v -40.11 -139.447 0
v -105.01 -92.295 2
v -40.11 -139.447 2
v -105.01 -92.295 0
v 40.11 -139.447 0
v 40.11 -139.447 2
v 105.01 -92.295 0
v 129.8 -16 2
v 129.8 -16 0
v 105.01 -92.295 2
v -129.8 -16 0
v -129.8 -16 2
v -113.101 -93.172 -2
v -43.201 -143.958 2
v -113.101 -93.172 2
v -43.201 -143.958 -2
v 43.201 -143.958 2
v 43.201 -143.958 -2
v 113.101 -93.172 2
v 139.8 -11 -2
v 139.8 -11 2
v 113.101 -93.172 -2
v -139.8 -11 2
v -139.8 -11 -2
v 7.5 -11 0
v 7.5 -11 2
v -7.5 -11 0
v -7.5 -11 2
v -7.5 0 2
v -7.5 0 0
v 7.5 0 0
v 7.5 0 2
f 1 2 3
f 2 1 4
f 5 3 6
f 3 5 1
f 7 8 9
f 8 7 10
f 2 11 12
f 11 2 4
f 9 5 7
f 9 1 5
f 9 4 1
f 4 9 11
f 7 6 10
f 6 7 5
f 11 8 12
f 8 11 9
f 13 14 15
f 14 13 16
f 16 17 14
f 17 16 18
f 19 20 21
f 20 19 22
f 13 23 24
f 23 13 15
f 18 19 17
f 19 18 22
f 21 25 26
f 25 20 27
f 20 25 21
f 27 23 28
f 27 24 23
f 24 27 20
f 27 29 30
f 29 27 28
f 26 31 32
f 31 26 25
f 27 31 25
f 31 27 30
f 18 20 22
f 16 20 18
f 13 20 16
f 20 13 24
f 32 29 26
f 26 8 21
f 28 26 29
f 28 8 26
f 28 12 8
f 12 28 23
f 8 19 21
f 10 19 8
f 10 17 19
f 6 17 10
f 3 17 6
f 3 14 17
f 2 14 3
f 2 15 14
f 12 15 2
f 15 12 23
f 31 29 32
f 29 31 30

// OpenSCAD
// file: Shared.scad
total_radius=161.8;
button_hole_radius=11.6;
button_outline_radius=15;
button_lip_radius=12.6;
button_lip_height=2;
lid_buffer=2;
lid_thickness=10;
bottom_thickness=5;
button_inset=lid_thickness+bottom_thickness+20;
button_outline_inset = lid_thickness + bottom_thickness + 16.8;
total_height=50;
lock_tube_outer_radius=5;
lock_tube_inner_radius=3.5;
lock_tube_thickness=lock_tube_outer_radius-lock_tube_inner_radius;
lock_slot_width=17;
lock_slot_height=total_height/2+lock_tube_outer_radius;
engrave_depth=3;
honeycomb_hex_radius = 10;
module EthernetCableHole() {
	translate([-total_radius+2*lid_thickness+2*bottom_thickness+20, 1, 20]) rotate([90, 0, 0]) linear_extrude(height=30) circle(r=10, $fn=100);
}

module PowerCableHole() {
	translate([total_radius-2*lid_thickness-2*bottom_thickness-20, 1, 20]) rotate([90, 0, 0]) linear_extrude(height=30) circle(r=7.5, $fn=100);
}
// file: Bottom.scad
include <Shared.scad>

module Bottom() {
	union() {
		difference() {
			linear_extrude(height=total_height-lid_thickness+4) circle(r=total_radius-(2*lid_thickness)-lid_buffer, $fn=10);
			translate([-200, 0, -1]) linear_extrude(height=total_height+2) square(size=[400, 200], center=false);
			BottomInnerCavity();
			translate([0, 0, 5]) EthernetCableHole();
			translate([0, 0, 5]) PowerCableHole();
		};
		BottomLockTube();
	}
}

module BottomInnerCavity() {
	difference() {
		translate([0, -bottom_thickness, bottom_thickness]) linear_extrude(height=total_height-bottom_thickness+1) circle(r=total_radius-(2*bottom_thickness)-(2*lid_thickness)-lid_buffer, $fn=10);
		translate([-200, -bottom_thickness, bottom_thickness-1]) linear_extrude(height=total_height+2) square(size=[400, 200], center=false);
	}
}

module BottomLockTube() {
	translate([-(lock_slot_width-lid_buffer)/2, lock_tube_outer_radius+lid_thickness, lock_slot_height+bottom_thickness-lock_tube_outer_radius]) rotate([-90, 180, -90]) linear_extrude(height=lock_slot_width-lid_buffer) difference(){
		union() {
			polygon([[0, lock_tube_outer_radius], [lock_tube_outer_radius, 0], [lock_tube_outer_radius, lock_tube_outer_radius-lock_slot_height], [-lid_thickness-lock_tube_outer_radius-1, lock_tube_outer_radius-lock_slot_height], [-lid_thickness-lock_tube_outer_radius-1, lock_tube_outer_radius]]);
			circle(r=lock_tube_outer_radius, $fn=500);
		}
		circle(r=lock_tube_inner_radius, $fn=500);
	}
}
// file: Top.scad
include <Shared.scad>

module Top() {
	union() {
		difference() {
			TopBody();
			ButtonHoles(button_hole_radius, button_inset);
			TopTexture();
			PowerCableHole();
			LockSlot();
		};
		translate([-lock_slot_width, -lid_thickness-1, -bottom_thickness]) TopLockTube();
		translate([lock_slot_width, -lid_thickness-1, -bottom_thickness]) TopLockTube();
	}
}

module TopBody() {
	difference() {
		linear_extrude(height=total_height) circle(r=total_radius, $fn=10);
		translate([-200, 0, -1]) linear_extrude(height=total_height+2) square(size=[400, 200], center=false);
		translate([0, -lid_thickness, -10]) TopInnerCavity();
		translate([0, -(cos(18) * total_radius + 1), total_height / 2]) rotate([-90, 0, 0]) Queen(total_height / 2, total_height / 2, engrave_depth);
		translate([-(cos(18) * total_radius + 1) * cos(54), -(cos(18) * total_radius + 1) * sin(54), total_height / 2]) rotate([-90, 0, -36]) Abs(total_height / 2, total_height / 2, engrave_depth);
		translate([-(cos(18) * total_radius + 1) * cos(18), -(cos(18) * total_radius + 1) * sin(18), total_height / 2]) rotate([-90, 0, -72]) Stripes(total_height / 2, total_height / 2, engrave_depth);
		translate([(cos(18) * total_radius + 1) * cos(54), -(cos(18) * total_radius + 1) * sin(54), total_height / 2]) rotate([-90, 0, 36]) Skulls(total_height / 2, total_height / 2, engrave_depth);
		translate([(cos(18) * total_radius + 1) * cos(18), -(cos(18) * total_radius + 1) * sin(18), total_height / 2]) rotate([-90, 0, 72]) Checks(total_height / 2, total_height / 2, engrave_depth);
	}
}

module TopInnerCavity() {
	difference() {
		translate([0, 0, 9]) linear_extrude(height=total_height-lid_thickness+1) circle(r=total_radius-(2*lid_thickness), $fn=10);
		translate([-200, 0, 9]) linear_extrude(height=total_height+2) square(size=[400, 200], center=false);
	}
}

module TopTexture() {
	intersection() {
		difference() {
			translate([0, -lid_thickness, 0]) difference() {
				translate([0, 0, total_height - engrave_depth]) linear_extrude(height=engrave_depth + 1) circle(r=total_radius - (2 * lid_thickness), $fn=10);
			translate([-200, 0, 9]) linear_extrude(height=total_height - engrave_depth + 2) square(size=[400, 200], center=false);
			}
			ButtonHoles(button_outline_radius, button_outline_inset);
		}
		HoneycombTexture();
	}
}

module HoneycombTexture() {
	for(x=[-floor(total_radius / honeycomb_hex_radius) : floor(total_radius / honeycomb_hex_radius)]) {
		for(y=[0 : floor(total_radius / honeycomb_hex_radius)]) {
			offset = y % 2 == 0 ? honeycomb_hex_radius : 0;
			translate([0, -total_radius, total_height - engrave_depth + 1]) linear_extrude(height=engrave_depth + 1) translate([x * honeycomb_hex_radius * 2 + offset, y * honeycomb_hex_radius * cos(30) * 2]) rotate([0, 0, 90]) circle(r=honeycomb_hex_radius, $fn=6);
		}
	}
}

module ButtonHoles(hole_radius, inset) {
	for(i=[[18,1], [54,1], [90,1], [54,-1], [18,-1]]) {
		button_center_polar_length=total_radius - inset - hole_radius;
		x=i[1]*cos(i[0])*(button_center_polar_length);
		y=-sin(i[0])*(button_center_polar_length);
		translate([x, y, -1]) linear_extrude(height=total_height+2) circle(r=hole_radius, $fn=100);
		translate([x, y, total_height-lid_thickness-button_lip_height]) linear_extrude(height=lid_thickness-button_lip_height+1) circle(r=button_lip_radius, $fn=100);
	}
}

module HiveMindLogo() {
	translate([-28, -25, total_height-2]) linear_extrude(height=3) text("HiveMind", font="Liberation Serif:style=Bold", $fn=100);
	translate([0, -45, total_height-2]) linear_extrude(height=3) circle(r=12, $fn=6);
	translate([19, -56, total_height-2]) linear_extrude(height=3) circle(r=12, $fn=6);
	translate([0, -67, total_height-2]) linear_extrude(height=3) circle(r=12, $fn=6);
	translate([-19, -78, total_height-2]) linear_extrude(height=3) circle(r=12, $fn=6);
}

module LockSlot() {
	translate([0, -lid_thickness/2, -1]) linear_extrude(height=lock_slot_height+1) square(size=[lock_slot_width, lid_thickness+1], center=true);
}

module TopLockTube() {
	translate([-(lock_slot_width)/2, lock_tube_outer_radius+lid_thickness, lock_slot_height+bottom_thickness-lock_tube_outer_radius]) rotate([-90, 180, -90]) linear_extrude(height=lock_slot_width) difference(){
		union() {
			polygon([[0, lock_tube_outer_radius], [lock_tube_outer_radius, 0], [lock_tube_outer_radius, lock_tube_outer_radius-lock_slot_height], [-lock_tube_outer_radius-1, lock_tube_outer_radius-lock_slot_height], [-lock_tube_outer_radius-1, lock_tube_outer_radius]]);
			circle(r=lock_tube_outer_radius, $fn=500);
		}
		circle(r=lock_tube_inner_radius, $fn=500);
	}
}

module Border(width, height) {
	difference() {
		translate([-width * 0.01, -height * 0.01, 0]) square(size=[width * 1.02, height * 1.02], center=false);
		translate([width * 0.01, height * 0.01]) square(size=[width * 0.98, height * 0.98], center=false);
	}
}
module ScaledPolygon(points, width, height) {
	function scalePoint(point) = [point[0] * width / 128, point[1] * height / 128];

	scaledPoints = [for (i = [0 : len(points) - 1]) scalePoint(points[i])];
	polygon(scaledPoints);
}

module Stripes(width, height, thickness) {
	translate([-width / 2, -height / 2, 0]) linear_extrude(height=thickness) union() {
		Border(width, height);
		square(size=[width, height * 0.2]);
		translate([0, height * 0.4, 0]) square(size=[width, height * 0.2]);
		translate([0, height * 0.8, 0]) square(size=[width, height * 0.2]);
	}
}

module Checks(width, height, thickness) {
	translate([-width / 2, -height / 2, 0]) linear_extrude(height=thickness) union() {
		Border(width, height);
		square(size=[width / 3, height / 3]);
		translate([2 * width / 3, 0, 0]) square(size=[width / 3, height / 3]);
		translate([1.01 * width / 3, 1.01 * width / 3, 0]) square(size=[0.98 * width / 3, 0.98 * height / 3]);
		translate([0, 2 * width / 3, 0]) square(size=[width / 3, height / 3]);
		translate([2 * width / 3, 2 * width / 3, 0]) square(size=[width / 3, height / 3]);
	}
}

module Queen(width, height, thickness) {
	translate([-width / 2, -height / 2, 0]) linear_extrude(height=thickness) difference() {
		square(size=[width, height], center=false);
		ScaledPolygon([[24, 112], [103.72, 112], [112, 24.73], [80, 56], [64, 16], [48, 56], [15.86, 24.73], [24, 112]], width, height);
	}
}

module Abs(width, height, thickness) {
	translate([-width / 2, -height / 2, 0]) linear_extrude(height=thickness) union() {
		Border(width, height);
		translate([28.29 * width / 128, 32.29 * height / 128, 0]) square(size=[14.29 * width / 128, 14.29 * width / 128]);
		translate([85.71 * width / 128, 32.29 * height / 128, 0]) square(size=[14.29 * width / 128, 14.29 * width / 128]);
		ScaledPolygon([[71.14, 18], [56.86, 18], [56.86, 60.86], [14, 60.86], [14, 75.14], [56.86, 75.14], [56.86, 89.43], [28.29, 89.43], [28.29, 103.71], [56.86, 103.71], [56.86, 128], [71.14, 128], [71.14, 103.71], [99.71, 103.71], [99.71, 89.43], [71.14, 89.43], [71.14, 75.14], [114, 75.14], [114, 60.86], [71.14, 60.86], [71.14, 18]], width, height);
	}
}

module Skulls(width, height, thickness) {
	translate([-width / 2, -height / 2, 0]) linear_extrude(height=thickness) union() {
		difference() {
			square(size=[width, height], center=false);
			ScaledPolygon([[99, 57], [99, 43], [85, 43], [85, 29], [43, 29], [43, 43], [29, 43], [29, 57], [15, 57], [15, 85], [29, 85], [29, 99], [43, 99], [43, 85], [57, 85], [57, 99], [71, 99], [71, 85], [85, 85], [85, 99], [99, 99], [99, 85], [113, 85], [113, 57], [99, 57]], width, height);
		}
		translate([43 * width / 128, 57 * height / 128, 0]) square(size=[14* width / 128, 14 * width / 128]);
		translate([71 * width / 128, 57 * height / 128, 0]) square(size=[14 * width / 128, 14 * width / 128]);
	}
}
// main file
include <Top.scad>
include <Bottom.scad>

//Top();
intersection() {
    translate([-200, -200, -2]) linear_extrude(height=4) square([400, 200]);
    translate([0, -lid_thickness-1, -bottom_thickness]) Bottom();
}
